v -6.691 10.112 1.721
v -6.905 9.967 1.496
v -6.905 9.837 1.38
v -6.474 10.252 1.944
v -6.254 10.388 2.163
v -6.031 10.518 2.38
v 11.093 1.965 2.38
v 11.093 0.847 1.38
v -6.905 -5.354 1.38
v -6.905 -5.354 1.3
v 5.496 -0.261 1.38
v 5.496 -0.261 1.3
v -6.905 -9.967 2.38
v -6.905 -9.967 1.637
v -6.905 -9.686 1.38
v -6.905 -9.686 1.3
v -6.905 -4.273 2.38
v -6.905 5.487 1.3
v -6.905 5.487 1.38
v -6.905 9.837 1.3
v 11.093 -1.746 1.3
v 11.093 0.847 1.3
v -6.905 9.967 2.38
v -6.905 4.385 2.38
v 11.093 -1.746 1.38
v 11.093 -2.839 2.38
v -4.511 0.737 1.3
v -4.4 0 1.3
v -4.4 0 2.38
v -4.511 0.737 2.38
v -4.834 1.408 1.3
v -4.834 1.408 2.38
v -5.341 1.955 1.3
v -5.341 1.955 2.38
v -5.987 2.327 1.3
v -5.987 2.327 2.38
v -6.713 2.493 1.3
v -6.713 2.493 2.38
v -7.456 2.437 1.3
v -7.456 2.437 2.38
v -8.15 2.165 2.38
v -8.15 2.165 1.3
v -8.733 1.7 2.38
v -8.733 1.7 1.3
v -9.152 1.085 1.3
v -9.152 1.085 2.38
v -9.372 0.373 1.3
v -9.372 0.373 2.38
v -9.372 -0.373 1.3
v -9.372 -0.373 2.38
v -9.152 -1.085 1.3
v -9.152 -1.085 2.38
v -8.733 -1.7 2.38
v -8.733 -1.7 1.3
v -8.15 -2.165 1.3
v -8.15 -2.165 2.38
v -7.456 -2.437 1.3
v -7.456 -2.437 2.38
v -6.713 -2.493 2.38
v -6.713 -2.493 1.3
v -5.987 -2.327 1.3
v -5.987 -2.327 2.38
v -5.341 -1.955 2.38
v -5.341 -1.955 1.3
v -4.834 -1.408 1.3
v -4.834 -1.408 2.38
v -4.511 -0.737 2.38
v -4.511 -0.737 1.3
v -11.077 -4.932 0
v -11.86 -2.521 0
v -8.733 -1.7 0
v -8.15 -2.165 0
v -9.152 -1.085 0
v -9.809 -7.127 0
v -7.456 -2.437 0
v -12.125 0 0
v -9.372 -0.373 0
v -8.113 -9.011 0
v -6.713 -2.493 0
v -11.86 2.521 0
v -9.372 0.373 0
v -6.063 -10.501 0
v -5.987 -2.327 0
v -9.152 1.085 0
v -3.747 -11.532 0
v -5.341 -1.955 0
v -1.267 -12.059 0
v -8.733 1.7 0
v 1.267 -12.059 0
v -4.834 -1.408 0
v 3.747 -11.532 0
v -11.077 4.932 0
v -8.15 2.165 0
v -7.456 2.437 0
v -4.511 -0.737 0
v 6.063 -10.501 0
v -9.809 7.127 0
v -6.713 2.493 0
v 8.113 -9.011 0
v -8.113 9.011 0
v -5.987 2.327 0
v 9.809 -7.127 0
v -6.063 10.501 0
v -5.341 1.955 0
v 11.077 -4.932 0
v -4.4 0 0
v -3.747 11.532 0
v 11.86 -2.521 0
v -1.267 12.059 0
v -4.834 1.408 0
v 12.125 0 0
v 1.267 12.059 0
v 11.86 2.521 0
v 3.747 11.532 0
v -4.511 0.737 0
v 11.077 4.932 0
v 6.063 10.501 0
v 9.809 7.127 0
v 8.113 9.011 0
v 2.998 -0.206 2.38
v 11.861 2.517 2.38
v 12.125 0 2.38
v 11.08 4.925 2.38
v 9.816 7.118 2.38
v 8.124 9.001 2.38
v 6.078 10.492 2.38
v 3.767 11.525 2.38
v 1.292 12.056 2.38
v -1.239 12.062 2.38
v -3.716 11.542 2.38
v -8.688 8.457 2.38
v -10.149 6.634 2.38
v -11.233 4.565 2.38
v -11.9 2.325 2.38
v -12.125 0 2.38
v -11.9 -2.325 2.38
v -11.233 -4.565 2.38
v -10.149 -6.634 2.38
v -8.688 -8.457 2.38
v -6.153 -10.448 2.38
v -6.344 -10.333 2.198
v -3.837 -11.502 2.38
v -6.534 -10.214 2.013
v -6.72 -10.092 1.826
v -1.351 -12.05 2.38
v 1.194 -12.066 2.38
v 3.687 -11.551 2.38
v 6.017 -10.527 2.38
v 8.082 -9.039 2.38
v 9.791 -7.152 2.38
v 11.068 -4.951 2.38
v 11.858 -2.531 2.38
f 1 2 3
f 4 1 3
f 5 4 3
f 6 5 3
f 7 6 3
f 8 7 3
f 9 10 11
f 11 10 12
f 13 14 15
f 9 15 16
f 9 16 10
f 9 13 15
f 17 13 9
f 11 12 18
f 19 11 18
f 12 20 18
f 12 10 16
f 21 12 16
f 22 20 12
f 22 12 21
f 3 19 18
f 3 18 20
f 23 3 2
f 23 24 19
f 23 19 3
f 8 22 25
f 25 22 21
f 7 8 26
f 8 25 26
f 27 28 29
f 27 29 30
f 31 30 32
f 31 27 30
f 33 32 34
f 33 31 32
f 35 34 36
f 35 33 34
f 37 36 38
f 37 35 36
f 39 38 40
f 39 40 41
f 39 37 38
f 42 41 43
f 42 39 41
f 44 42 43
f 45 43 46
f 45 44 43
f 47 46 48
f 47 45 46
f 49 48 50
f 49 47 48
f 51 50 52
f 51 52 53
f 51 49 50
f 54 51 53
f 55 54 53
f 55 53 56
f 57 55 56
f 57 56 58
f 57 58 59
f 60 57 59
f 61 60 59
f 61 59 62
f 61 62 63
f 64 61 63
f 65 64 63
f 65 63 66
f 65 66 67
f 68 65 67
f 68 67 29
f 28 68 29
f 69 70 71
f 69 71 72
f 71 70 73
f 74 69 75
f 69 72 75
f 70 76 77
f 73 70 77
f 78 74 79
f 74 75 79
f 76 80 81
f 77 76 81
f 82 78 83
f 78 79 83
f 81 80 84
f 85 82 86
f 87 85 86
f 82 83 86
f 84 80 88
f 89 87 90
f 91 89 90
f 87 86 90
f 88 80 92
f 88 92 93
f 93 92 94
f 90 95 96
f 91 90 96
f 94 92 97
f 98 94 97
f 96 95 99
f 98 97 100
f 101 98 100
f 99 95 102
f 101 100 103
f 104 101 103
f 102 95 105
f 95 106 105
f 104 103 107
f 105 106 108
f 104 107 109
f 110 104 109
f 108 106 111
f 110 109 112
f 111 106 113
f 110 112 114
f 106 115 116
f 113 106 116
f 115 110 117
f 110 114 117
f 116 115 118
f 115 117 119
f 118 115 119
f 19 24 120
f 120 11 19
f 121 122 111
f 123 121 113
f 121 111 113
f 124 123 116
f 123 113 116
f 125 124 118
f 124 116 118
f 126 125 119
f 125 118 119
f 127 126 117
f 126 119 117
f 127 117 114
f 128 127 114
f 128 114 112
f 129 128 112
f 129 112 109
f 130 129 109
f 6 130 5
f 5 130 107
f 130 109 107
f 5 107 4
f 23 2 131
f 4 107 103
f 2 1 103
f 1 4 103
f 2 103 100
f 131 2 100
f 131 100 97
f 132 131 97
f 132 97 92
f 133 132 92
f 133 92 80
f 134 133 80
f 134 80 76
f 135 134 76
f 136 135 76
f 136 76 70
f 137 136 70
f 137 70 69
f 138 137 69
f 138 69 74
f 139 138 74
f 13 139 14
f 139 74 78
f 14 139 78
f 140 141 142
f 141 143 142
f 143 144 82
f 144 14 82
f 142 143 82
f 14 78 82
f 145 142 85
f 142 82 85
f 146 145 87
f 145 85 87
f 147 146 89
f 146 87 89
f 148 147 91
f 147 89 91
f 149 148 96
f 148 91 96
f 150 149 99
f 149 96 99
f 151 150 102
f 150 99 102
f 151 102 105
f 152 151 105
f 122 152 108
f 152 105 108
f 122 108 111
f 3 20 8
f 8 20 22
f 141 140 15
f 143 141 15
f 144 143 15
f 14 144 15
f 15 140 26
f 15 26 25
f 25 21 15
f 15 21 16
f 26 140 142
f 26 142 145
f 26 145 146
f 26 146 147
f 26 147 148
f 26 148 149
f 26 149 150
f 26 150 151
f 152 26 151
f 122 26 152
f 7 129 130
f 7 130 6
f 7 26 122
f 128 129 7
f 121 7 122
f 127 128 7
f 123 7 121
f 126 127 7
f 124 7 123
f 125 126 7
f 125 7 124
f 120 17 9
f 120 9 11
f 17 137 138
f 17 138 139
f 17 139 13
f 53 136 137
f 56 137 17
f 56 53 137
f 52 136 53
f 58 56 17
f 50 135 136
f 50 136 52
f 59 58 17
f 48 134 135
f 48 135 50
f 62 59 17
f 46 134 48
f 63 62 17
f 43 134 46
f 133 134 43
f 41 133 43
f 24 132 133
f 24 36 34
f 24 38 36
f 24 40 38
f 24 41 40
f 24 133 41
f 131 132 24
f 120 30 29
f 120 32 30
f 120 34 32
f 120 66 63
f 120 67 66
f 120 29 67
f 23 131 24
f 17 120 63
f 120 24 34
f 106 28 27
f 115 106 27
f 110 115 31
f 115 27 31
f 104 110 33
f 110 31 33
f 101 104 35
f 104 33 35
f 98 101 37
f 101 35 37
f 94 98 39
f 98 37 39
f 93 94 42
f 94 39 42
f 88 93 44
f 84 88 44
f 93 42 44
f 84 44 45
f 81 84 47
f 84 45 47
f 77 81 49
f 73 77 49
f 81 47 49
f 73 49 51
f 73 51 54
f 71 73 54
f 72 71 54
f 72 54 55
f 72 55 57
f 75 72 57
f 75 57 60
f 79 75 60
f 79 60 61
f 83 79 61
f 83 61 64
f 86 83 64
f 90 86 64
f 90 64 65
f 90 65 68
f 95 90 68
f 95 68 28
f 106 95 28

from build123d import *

# Parameters (mm, degrees)
F0_R         = 12.125
F0_R_2       = 2.5
F1_DEPTH     = 2.38
F2_R         = 12.125
F3_DEPTH     = 1.3
F4_T4_DEPTH  = 25.2617303144
F4_T10_DEPTH = 18.811479046
F4_T15_DEPTH = 18.5490461255
F4_T20_DEPTH = 24.8150280867
F5_R         = 2.5
F6_DEPTH     = 25


# Not quite as in the source:
# - a fillet or chamfer that OpenCascade refuses, or shapes differently, is made with other operations: its cross-section is extruded or revolved along the edge and cut away or added


with BuildPart() as f1:
    # F0 (on Top) → F1 (new body)
    with BuildSketch(Plane.XY):
        Circle(F0_R)
        with Locations((-6.9000022486, 0)):
            Circle(F0_R_2, mode=Mode.SUBTRACT)
        Polygon((-6.9049564988, -9.6863286317), (-6.9049564988, -5.3536104666), (5.4957817031, -0.2610715792), (-6.9049564988, 5.4868851832), (-6.9049564988, 9.8370038228), (11.0929343528, 0.8467586343), (11.0929343528, -1.7459120749), align=None, mode=Mode.SUBTRACT)
    extrude(amount=F1_DEPTH)

    # F2 (on Top) → F3 (join)
    with BuildSketch(Plane.XY):
        Circle(F2_R)
    extrude(amount=F3_DEPTH)

    # F4: chamfer of 1 on 4 edges, made by hand


with BuildPart() as f4_tool2:
    # F4_s3 → F4_t4 (new body)
    with BuildSketch(Plane(origin=(-11.7592465012, 5.8739387937, 0), x_dir=(0, 0, 1), z_dir=(0.8946001051, -0.4468676, 0))):
        Polygon((2.38, -6.7145833148), (1.38, -5.7145833148), (2.38, -5.7145833148), align=None)
    extrude(amount=F4_T4_DEPTH)

    split(bisect_by=Plane.YZ.offset(11.0929343528), keep=Keep.BOTTOM)

    split(bisect_by=Plane.YZ.offset(-6.9049564988), keep=Keep.TOP)


with BuildPart() as f1_1:
    add(f1.part)

    # F4_t1: cut F4_tool2
    add(f4_tool2.part, mode=Mode.SUBTRACT)


with BuildPart() as f4_tool8:
    # F4_s9 → F4_t10 (new body)
    with BuildSketch(Plane(origin=(6.9566759614, -3.2245396996, 0), x_dir=(0, 0, 1), z_dir=(-0.907275067, 0.4205376948, 0))):
        Polygon((2.38, 1.0743196339), (1.38, 2.0743196339), (2.38, 2.0743196339), align=None)
    extrude(amount=F4_T10_DEPTH)

    split(bisect_by=Plane.YZ.offset(-6.9049564988), keep=Keep.TOP)


with BuildPart() as f1_2:
    add(f1_1.part)

    # F4_t7: cut F4_tool8
    add(f4_tool8.part, mode=Mode.SUBTRACT)


with BuildPart() as f4_tool13:
    # F4_s14 → F4_t15 (new body)
    with BuildSketch(Plane(origin=(-10.1686835399, -4.1759140075, 0), x_dir=(0, 0, 1), z_dir=(0.9250361088, 0.3798791878, 0))):
        Polygon((2.38, 1.3292337276), (1.38, 2.3292337276), (2.38, 2.3292337276), align=None)
    extrude(amount=F4_T15_DEPTH)

    split(bisect_by=Plane.YZ.offset(-6.9049564988), keep=Keep.TOP)


with BuildPart() as f1_3:
    add(f1_2.part)

    # F4_t12: cut F4_tool13
    add(f4_tool13.part, mode=Mode.SUBTRACT)


with BuildPart() as f4_tool18:
    # F4_s19 → F4_t20 (new body)
    with BuildSketch(Plane(origin=(10.9936482118, 4.8502431202, 0), x_dir=(0, 0, 1), z_dir=(-0.914914599, -0.4036474657, 0))):
        Polygon((2.38, -7.0749952843), (1.38, -6.0749952843), (2.38, -6.0749952843), align=None)
    extrude(amount=F4_T20_DEPTH)

    split(bisect_by=Plane.YZ.offset(11.0929343528), keep=Keep.BOTTOM)

    split(bisect_by=Plane.YZ.offset(-6.9049564988), keep=Keep.TOP)


with BuildPart() as f1_4:
    add(f1_3.part)

    # F4_t17: cut F4_tool18
    add(f4_tool18.part, mode=Mode.SUBTRACT)

    # F5 (on face) → F6 (cut)
    with BuildSketch(Plane.XY.offset(2.38)):
        with Locations((-6.9000022486, 0)):
            Circle(F5_R)
    extrude(amount=-F6_DEPTH, mode=Mode.SUBTRACT)


solid = f1_4.part
